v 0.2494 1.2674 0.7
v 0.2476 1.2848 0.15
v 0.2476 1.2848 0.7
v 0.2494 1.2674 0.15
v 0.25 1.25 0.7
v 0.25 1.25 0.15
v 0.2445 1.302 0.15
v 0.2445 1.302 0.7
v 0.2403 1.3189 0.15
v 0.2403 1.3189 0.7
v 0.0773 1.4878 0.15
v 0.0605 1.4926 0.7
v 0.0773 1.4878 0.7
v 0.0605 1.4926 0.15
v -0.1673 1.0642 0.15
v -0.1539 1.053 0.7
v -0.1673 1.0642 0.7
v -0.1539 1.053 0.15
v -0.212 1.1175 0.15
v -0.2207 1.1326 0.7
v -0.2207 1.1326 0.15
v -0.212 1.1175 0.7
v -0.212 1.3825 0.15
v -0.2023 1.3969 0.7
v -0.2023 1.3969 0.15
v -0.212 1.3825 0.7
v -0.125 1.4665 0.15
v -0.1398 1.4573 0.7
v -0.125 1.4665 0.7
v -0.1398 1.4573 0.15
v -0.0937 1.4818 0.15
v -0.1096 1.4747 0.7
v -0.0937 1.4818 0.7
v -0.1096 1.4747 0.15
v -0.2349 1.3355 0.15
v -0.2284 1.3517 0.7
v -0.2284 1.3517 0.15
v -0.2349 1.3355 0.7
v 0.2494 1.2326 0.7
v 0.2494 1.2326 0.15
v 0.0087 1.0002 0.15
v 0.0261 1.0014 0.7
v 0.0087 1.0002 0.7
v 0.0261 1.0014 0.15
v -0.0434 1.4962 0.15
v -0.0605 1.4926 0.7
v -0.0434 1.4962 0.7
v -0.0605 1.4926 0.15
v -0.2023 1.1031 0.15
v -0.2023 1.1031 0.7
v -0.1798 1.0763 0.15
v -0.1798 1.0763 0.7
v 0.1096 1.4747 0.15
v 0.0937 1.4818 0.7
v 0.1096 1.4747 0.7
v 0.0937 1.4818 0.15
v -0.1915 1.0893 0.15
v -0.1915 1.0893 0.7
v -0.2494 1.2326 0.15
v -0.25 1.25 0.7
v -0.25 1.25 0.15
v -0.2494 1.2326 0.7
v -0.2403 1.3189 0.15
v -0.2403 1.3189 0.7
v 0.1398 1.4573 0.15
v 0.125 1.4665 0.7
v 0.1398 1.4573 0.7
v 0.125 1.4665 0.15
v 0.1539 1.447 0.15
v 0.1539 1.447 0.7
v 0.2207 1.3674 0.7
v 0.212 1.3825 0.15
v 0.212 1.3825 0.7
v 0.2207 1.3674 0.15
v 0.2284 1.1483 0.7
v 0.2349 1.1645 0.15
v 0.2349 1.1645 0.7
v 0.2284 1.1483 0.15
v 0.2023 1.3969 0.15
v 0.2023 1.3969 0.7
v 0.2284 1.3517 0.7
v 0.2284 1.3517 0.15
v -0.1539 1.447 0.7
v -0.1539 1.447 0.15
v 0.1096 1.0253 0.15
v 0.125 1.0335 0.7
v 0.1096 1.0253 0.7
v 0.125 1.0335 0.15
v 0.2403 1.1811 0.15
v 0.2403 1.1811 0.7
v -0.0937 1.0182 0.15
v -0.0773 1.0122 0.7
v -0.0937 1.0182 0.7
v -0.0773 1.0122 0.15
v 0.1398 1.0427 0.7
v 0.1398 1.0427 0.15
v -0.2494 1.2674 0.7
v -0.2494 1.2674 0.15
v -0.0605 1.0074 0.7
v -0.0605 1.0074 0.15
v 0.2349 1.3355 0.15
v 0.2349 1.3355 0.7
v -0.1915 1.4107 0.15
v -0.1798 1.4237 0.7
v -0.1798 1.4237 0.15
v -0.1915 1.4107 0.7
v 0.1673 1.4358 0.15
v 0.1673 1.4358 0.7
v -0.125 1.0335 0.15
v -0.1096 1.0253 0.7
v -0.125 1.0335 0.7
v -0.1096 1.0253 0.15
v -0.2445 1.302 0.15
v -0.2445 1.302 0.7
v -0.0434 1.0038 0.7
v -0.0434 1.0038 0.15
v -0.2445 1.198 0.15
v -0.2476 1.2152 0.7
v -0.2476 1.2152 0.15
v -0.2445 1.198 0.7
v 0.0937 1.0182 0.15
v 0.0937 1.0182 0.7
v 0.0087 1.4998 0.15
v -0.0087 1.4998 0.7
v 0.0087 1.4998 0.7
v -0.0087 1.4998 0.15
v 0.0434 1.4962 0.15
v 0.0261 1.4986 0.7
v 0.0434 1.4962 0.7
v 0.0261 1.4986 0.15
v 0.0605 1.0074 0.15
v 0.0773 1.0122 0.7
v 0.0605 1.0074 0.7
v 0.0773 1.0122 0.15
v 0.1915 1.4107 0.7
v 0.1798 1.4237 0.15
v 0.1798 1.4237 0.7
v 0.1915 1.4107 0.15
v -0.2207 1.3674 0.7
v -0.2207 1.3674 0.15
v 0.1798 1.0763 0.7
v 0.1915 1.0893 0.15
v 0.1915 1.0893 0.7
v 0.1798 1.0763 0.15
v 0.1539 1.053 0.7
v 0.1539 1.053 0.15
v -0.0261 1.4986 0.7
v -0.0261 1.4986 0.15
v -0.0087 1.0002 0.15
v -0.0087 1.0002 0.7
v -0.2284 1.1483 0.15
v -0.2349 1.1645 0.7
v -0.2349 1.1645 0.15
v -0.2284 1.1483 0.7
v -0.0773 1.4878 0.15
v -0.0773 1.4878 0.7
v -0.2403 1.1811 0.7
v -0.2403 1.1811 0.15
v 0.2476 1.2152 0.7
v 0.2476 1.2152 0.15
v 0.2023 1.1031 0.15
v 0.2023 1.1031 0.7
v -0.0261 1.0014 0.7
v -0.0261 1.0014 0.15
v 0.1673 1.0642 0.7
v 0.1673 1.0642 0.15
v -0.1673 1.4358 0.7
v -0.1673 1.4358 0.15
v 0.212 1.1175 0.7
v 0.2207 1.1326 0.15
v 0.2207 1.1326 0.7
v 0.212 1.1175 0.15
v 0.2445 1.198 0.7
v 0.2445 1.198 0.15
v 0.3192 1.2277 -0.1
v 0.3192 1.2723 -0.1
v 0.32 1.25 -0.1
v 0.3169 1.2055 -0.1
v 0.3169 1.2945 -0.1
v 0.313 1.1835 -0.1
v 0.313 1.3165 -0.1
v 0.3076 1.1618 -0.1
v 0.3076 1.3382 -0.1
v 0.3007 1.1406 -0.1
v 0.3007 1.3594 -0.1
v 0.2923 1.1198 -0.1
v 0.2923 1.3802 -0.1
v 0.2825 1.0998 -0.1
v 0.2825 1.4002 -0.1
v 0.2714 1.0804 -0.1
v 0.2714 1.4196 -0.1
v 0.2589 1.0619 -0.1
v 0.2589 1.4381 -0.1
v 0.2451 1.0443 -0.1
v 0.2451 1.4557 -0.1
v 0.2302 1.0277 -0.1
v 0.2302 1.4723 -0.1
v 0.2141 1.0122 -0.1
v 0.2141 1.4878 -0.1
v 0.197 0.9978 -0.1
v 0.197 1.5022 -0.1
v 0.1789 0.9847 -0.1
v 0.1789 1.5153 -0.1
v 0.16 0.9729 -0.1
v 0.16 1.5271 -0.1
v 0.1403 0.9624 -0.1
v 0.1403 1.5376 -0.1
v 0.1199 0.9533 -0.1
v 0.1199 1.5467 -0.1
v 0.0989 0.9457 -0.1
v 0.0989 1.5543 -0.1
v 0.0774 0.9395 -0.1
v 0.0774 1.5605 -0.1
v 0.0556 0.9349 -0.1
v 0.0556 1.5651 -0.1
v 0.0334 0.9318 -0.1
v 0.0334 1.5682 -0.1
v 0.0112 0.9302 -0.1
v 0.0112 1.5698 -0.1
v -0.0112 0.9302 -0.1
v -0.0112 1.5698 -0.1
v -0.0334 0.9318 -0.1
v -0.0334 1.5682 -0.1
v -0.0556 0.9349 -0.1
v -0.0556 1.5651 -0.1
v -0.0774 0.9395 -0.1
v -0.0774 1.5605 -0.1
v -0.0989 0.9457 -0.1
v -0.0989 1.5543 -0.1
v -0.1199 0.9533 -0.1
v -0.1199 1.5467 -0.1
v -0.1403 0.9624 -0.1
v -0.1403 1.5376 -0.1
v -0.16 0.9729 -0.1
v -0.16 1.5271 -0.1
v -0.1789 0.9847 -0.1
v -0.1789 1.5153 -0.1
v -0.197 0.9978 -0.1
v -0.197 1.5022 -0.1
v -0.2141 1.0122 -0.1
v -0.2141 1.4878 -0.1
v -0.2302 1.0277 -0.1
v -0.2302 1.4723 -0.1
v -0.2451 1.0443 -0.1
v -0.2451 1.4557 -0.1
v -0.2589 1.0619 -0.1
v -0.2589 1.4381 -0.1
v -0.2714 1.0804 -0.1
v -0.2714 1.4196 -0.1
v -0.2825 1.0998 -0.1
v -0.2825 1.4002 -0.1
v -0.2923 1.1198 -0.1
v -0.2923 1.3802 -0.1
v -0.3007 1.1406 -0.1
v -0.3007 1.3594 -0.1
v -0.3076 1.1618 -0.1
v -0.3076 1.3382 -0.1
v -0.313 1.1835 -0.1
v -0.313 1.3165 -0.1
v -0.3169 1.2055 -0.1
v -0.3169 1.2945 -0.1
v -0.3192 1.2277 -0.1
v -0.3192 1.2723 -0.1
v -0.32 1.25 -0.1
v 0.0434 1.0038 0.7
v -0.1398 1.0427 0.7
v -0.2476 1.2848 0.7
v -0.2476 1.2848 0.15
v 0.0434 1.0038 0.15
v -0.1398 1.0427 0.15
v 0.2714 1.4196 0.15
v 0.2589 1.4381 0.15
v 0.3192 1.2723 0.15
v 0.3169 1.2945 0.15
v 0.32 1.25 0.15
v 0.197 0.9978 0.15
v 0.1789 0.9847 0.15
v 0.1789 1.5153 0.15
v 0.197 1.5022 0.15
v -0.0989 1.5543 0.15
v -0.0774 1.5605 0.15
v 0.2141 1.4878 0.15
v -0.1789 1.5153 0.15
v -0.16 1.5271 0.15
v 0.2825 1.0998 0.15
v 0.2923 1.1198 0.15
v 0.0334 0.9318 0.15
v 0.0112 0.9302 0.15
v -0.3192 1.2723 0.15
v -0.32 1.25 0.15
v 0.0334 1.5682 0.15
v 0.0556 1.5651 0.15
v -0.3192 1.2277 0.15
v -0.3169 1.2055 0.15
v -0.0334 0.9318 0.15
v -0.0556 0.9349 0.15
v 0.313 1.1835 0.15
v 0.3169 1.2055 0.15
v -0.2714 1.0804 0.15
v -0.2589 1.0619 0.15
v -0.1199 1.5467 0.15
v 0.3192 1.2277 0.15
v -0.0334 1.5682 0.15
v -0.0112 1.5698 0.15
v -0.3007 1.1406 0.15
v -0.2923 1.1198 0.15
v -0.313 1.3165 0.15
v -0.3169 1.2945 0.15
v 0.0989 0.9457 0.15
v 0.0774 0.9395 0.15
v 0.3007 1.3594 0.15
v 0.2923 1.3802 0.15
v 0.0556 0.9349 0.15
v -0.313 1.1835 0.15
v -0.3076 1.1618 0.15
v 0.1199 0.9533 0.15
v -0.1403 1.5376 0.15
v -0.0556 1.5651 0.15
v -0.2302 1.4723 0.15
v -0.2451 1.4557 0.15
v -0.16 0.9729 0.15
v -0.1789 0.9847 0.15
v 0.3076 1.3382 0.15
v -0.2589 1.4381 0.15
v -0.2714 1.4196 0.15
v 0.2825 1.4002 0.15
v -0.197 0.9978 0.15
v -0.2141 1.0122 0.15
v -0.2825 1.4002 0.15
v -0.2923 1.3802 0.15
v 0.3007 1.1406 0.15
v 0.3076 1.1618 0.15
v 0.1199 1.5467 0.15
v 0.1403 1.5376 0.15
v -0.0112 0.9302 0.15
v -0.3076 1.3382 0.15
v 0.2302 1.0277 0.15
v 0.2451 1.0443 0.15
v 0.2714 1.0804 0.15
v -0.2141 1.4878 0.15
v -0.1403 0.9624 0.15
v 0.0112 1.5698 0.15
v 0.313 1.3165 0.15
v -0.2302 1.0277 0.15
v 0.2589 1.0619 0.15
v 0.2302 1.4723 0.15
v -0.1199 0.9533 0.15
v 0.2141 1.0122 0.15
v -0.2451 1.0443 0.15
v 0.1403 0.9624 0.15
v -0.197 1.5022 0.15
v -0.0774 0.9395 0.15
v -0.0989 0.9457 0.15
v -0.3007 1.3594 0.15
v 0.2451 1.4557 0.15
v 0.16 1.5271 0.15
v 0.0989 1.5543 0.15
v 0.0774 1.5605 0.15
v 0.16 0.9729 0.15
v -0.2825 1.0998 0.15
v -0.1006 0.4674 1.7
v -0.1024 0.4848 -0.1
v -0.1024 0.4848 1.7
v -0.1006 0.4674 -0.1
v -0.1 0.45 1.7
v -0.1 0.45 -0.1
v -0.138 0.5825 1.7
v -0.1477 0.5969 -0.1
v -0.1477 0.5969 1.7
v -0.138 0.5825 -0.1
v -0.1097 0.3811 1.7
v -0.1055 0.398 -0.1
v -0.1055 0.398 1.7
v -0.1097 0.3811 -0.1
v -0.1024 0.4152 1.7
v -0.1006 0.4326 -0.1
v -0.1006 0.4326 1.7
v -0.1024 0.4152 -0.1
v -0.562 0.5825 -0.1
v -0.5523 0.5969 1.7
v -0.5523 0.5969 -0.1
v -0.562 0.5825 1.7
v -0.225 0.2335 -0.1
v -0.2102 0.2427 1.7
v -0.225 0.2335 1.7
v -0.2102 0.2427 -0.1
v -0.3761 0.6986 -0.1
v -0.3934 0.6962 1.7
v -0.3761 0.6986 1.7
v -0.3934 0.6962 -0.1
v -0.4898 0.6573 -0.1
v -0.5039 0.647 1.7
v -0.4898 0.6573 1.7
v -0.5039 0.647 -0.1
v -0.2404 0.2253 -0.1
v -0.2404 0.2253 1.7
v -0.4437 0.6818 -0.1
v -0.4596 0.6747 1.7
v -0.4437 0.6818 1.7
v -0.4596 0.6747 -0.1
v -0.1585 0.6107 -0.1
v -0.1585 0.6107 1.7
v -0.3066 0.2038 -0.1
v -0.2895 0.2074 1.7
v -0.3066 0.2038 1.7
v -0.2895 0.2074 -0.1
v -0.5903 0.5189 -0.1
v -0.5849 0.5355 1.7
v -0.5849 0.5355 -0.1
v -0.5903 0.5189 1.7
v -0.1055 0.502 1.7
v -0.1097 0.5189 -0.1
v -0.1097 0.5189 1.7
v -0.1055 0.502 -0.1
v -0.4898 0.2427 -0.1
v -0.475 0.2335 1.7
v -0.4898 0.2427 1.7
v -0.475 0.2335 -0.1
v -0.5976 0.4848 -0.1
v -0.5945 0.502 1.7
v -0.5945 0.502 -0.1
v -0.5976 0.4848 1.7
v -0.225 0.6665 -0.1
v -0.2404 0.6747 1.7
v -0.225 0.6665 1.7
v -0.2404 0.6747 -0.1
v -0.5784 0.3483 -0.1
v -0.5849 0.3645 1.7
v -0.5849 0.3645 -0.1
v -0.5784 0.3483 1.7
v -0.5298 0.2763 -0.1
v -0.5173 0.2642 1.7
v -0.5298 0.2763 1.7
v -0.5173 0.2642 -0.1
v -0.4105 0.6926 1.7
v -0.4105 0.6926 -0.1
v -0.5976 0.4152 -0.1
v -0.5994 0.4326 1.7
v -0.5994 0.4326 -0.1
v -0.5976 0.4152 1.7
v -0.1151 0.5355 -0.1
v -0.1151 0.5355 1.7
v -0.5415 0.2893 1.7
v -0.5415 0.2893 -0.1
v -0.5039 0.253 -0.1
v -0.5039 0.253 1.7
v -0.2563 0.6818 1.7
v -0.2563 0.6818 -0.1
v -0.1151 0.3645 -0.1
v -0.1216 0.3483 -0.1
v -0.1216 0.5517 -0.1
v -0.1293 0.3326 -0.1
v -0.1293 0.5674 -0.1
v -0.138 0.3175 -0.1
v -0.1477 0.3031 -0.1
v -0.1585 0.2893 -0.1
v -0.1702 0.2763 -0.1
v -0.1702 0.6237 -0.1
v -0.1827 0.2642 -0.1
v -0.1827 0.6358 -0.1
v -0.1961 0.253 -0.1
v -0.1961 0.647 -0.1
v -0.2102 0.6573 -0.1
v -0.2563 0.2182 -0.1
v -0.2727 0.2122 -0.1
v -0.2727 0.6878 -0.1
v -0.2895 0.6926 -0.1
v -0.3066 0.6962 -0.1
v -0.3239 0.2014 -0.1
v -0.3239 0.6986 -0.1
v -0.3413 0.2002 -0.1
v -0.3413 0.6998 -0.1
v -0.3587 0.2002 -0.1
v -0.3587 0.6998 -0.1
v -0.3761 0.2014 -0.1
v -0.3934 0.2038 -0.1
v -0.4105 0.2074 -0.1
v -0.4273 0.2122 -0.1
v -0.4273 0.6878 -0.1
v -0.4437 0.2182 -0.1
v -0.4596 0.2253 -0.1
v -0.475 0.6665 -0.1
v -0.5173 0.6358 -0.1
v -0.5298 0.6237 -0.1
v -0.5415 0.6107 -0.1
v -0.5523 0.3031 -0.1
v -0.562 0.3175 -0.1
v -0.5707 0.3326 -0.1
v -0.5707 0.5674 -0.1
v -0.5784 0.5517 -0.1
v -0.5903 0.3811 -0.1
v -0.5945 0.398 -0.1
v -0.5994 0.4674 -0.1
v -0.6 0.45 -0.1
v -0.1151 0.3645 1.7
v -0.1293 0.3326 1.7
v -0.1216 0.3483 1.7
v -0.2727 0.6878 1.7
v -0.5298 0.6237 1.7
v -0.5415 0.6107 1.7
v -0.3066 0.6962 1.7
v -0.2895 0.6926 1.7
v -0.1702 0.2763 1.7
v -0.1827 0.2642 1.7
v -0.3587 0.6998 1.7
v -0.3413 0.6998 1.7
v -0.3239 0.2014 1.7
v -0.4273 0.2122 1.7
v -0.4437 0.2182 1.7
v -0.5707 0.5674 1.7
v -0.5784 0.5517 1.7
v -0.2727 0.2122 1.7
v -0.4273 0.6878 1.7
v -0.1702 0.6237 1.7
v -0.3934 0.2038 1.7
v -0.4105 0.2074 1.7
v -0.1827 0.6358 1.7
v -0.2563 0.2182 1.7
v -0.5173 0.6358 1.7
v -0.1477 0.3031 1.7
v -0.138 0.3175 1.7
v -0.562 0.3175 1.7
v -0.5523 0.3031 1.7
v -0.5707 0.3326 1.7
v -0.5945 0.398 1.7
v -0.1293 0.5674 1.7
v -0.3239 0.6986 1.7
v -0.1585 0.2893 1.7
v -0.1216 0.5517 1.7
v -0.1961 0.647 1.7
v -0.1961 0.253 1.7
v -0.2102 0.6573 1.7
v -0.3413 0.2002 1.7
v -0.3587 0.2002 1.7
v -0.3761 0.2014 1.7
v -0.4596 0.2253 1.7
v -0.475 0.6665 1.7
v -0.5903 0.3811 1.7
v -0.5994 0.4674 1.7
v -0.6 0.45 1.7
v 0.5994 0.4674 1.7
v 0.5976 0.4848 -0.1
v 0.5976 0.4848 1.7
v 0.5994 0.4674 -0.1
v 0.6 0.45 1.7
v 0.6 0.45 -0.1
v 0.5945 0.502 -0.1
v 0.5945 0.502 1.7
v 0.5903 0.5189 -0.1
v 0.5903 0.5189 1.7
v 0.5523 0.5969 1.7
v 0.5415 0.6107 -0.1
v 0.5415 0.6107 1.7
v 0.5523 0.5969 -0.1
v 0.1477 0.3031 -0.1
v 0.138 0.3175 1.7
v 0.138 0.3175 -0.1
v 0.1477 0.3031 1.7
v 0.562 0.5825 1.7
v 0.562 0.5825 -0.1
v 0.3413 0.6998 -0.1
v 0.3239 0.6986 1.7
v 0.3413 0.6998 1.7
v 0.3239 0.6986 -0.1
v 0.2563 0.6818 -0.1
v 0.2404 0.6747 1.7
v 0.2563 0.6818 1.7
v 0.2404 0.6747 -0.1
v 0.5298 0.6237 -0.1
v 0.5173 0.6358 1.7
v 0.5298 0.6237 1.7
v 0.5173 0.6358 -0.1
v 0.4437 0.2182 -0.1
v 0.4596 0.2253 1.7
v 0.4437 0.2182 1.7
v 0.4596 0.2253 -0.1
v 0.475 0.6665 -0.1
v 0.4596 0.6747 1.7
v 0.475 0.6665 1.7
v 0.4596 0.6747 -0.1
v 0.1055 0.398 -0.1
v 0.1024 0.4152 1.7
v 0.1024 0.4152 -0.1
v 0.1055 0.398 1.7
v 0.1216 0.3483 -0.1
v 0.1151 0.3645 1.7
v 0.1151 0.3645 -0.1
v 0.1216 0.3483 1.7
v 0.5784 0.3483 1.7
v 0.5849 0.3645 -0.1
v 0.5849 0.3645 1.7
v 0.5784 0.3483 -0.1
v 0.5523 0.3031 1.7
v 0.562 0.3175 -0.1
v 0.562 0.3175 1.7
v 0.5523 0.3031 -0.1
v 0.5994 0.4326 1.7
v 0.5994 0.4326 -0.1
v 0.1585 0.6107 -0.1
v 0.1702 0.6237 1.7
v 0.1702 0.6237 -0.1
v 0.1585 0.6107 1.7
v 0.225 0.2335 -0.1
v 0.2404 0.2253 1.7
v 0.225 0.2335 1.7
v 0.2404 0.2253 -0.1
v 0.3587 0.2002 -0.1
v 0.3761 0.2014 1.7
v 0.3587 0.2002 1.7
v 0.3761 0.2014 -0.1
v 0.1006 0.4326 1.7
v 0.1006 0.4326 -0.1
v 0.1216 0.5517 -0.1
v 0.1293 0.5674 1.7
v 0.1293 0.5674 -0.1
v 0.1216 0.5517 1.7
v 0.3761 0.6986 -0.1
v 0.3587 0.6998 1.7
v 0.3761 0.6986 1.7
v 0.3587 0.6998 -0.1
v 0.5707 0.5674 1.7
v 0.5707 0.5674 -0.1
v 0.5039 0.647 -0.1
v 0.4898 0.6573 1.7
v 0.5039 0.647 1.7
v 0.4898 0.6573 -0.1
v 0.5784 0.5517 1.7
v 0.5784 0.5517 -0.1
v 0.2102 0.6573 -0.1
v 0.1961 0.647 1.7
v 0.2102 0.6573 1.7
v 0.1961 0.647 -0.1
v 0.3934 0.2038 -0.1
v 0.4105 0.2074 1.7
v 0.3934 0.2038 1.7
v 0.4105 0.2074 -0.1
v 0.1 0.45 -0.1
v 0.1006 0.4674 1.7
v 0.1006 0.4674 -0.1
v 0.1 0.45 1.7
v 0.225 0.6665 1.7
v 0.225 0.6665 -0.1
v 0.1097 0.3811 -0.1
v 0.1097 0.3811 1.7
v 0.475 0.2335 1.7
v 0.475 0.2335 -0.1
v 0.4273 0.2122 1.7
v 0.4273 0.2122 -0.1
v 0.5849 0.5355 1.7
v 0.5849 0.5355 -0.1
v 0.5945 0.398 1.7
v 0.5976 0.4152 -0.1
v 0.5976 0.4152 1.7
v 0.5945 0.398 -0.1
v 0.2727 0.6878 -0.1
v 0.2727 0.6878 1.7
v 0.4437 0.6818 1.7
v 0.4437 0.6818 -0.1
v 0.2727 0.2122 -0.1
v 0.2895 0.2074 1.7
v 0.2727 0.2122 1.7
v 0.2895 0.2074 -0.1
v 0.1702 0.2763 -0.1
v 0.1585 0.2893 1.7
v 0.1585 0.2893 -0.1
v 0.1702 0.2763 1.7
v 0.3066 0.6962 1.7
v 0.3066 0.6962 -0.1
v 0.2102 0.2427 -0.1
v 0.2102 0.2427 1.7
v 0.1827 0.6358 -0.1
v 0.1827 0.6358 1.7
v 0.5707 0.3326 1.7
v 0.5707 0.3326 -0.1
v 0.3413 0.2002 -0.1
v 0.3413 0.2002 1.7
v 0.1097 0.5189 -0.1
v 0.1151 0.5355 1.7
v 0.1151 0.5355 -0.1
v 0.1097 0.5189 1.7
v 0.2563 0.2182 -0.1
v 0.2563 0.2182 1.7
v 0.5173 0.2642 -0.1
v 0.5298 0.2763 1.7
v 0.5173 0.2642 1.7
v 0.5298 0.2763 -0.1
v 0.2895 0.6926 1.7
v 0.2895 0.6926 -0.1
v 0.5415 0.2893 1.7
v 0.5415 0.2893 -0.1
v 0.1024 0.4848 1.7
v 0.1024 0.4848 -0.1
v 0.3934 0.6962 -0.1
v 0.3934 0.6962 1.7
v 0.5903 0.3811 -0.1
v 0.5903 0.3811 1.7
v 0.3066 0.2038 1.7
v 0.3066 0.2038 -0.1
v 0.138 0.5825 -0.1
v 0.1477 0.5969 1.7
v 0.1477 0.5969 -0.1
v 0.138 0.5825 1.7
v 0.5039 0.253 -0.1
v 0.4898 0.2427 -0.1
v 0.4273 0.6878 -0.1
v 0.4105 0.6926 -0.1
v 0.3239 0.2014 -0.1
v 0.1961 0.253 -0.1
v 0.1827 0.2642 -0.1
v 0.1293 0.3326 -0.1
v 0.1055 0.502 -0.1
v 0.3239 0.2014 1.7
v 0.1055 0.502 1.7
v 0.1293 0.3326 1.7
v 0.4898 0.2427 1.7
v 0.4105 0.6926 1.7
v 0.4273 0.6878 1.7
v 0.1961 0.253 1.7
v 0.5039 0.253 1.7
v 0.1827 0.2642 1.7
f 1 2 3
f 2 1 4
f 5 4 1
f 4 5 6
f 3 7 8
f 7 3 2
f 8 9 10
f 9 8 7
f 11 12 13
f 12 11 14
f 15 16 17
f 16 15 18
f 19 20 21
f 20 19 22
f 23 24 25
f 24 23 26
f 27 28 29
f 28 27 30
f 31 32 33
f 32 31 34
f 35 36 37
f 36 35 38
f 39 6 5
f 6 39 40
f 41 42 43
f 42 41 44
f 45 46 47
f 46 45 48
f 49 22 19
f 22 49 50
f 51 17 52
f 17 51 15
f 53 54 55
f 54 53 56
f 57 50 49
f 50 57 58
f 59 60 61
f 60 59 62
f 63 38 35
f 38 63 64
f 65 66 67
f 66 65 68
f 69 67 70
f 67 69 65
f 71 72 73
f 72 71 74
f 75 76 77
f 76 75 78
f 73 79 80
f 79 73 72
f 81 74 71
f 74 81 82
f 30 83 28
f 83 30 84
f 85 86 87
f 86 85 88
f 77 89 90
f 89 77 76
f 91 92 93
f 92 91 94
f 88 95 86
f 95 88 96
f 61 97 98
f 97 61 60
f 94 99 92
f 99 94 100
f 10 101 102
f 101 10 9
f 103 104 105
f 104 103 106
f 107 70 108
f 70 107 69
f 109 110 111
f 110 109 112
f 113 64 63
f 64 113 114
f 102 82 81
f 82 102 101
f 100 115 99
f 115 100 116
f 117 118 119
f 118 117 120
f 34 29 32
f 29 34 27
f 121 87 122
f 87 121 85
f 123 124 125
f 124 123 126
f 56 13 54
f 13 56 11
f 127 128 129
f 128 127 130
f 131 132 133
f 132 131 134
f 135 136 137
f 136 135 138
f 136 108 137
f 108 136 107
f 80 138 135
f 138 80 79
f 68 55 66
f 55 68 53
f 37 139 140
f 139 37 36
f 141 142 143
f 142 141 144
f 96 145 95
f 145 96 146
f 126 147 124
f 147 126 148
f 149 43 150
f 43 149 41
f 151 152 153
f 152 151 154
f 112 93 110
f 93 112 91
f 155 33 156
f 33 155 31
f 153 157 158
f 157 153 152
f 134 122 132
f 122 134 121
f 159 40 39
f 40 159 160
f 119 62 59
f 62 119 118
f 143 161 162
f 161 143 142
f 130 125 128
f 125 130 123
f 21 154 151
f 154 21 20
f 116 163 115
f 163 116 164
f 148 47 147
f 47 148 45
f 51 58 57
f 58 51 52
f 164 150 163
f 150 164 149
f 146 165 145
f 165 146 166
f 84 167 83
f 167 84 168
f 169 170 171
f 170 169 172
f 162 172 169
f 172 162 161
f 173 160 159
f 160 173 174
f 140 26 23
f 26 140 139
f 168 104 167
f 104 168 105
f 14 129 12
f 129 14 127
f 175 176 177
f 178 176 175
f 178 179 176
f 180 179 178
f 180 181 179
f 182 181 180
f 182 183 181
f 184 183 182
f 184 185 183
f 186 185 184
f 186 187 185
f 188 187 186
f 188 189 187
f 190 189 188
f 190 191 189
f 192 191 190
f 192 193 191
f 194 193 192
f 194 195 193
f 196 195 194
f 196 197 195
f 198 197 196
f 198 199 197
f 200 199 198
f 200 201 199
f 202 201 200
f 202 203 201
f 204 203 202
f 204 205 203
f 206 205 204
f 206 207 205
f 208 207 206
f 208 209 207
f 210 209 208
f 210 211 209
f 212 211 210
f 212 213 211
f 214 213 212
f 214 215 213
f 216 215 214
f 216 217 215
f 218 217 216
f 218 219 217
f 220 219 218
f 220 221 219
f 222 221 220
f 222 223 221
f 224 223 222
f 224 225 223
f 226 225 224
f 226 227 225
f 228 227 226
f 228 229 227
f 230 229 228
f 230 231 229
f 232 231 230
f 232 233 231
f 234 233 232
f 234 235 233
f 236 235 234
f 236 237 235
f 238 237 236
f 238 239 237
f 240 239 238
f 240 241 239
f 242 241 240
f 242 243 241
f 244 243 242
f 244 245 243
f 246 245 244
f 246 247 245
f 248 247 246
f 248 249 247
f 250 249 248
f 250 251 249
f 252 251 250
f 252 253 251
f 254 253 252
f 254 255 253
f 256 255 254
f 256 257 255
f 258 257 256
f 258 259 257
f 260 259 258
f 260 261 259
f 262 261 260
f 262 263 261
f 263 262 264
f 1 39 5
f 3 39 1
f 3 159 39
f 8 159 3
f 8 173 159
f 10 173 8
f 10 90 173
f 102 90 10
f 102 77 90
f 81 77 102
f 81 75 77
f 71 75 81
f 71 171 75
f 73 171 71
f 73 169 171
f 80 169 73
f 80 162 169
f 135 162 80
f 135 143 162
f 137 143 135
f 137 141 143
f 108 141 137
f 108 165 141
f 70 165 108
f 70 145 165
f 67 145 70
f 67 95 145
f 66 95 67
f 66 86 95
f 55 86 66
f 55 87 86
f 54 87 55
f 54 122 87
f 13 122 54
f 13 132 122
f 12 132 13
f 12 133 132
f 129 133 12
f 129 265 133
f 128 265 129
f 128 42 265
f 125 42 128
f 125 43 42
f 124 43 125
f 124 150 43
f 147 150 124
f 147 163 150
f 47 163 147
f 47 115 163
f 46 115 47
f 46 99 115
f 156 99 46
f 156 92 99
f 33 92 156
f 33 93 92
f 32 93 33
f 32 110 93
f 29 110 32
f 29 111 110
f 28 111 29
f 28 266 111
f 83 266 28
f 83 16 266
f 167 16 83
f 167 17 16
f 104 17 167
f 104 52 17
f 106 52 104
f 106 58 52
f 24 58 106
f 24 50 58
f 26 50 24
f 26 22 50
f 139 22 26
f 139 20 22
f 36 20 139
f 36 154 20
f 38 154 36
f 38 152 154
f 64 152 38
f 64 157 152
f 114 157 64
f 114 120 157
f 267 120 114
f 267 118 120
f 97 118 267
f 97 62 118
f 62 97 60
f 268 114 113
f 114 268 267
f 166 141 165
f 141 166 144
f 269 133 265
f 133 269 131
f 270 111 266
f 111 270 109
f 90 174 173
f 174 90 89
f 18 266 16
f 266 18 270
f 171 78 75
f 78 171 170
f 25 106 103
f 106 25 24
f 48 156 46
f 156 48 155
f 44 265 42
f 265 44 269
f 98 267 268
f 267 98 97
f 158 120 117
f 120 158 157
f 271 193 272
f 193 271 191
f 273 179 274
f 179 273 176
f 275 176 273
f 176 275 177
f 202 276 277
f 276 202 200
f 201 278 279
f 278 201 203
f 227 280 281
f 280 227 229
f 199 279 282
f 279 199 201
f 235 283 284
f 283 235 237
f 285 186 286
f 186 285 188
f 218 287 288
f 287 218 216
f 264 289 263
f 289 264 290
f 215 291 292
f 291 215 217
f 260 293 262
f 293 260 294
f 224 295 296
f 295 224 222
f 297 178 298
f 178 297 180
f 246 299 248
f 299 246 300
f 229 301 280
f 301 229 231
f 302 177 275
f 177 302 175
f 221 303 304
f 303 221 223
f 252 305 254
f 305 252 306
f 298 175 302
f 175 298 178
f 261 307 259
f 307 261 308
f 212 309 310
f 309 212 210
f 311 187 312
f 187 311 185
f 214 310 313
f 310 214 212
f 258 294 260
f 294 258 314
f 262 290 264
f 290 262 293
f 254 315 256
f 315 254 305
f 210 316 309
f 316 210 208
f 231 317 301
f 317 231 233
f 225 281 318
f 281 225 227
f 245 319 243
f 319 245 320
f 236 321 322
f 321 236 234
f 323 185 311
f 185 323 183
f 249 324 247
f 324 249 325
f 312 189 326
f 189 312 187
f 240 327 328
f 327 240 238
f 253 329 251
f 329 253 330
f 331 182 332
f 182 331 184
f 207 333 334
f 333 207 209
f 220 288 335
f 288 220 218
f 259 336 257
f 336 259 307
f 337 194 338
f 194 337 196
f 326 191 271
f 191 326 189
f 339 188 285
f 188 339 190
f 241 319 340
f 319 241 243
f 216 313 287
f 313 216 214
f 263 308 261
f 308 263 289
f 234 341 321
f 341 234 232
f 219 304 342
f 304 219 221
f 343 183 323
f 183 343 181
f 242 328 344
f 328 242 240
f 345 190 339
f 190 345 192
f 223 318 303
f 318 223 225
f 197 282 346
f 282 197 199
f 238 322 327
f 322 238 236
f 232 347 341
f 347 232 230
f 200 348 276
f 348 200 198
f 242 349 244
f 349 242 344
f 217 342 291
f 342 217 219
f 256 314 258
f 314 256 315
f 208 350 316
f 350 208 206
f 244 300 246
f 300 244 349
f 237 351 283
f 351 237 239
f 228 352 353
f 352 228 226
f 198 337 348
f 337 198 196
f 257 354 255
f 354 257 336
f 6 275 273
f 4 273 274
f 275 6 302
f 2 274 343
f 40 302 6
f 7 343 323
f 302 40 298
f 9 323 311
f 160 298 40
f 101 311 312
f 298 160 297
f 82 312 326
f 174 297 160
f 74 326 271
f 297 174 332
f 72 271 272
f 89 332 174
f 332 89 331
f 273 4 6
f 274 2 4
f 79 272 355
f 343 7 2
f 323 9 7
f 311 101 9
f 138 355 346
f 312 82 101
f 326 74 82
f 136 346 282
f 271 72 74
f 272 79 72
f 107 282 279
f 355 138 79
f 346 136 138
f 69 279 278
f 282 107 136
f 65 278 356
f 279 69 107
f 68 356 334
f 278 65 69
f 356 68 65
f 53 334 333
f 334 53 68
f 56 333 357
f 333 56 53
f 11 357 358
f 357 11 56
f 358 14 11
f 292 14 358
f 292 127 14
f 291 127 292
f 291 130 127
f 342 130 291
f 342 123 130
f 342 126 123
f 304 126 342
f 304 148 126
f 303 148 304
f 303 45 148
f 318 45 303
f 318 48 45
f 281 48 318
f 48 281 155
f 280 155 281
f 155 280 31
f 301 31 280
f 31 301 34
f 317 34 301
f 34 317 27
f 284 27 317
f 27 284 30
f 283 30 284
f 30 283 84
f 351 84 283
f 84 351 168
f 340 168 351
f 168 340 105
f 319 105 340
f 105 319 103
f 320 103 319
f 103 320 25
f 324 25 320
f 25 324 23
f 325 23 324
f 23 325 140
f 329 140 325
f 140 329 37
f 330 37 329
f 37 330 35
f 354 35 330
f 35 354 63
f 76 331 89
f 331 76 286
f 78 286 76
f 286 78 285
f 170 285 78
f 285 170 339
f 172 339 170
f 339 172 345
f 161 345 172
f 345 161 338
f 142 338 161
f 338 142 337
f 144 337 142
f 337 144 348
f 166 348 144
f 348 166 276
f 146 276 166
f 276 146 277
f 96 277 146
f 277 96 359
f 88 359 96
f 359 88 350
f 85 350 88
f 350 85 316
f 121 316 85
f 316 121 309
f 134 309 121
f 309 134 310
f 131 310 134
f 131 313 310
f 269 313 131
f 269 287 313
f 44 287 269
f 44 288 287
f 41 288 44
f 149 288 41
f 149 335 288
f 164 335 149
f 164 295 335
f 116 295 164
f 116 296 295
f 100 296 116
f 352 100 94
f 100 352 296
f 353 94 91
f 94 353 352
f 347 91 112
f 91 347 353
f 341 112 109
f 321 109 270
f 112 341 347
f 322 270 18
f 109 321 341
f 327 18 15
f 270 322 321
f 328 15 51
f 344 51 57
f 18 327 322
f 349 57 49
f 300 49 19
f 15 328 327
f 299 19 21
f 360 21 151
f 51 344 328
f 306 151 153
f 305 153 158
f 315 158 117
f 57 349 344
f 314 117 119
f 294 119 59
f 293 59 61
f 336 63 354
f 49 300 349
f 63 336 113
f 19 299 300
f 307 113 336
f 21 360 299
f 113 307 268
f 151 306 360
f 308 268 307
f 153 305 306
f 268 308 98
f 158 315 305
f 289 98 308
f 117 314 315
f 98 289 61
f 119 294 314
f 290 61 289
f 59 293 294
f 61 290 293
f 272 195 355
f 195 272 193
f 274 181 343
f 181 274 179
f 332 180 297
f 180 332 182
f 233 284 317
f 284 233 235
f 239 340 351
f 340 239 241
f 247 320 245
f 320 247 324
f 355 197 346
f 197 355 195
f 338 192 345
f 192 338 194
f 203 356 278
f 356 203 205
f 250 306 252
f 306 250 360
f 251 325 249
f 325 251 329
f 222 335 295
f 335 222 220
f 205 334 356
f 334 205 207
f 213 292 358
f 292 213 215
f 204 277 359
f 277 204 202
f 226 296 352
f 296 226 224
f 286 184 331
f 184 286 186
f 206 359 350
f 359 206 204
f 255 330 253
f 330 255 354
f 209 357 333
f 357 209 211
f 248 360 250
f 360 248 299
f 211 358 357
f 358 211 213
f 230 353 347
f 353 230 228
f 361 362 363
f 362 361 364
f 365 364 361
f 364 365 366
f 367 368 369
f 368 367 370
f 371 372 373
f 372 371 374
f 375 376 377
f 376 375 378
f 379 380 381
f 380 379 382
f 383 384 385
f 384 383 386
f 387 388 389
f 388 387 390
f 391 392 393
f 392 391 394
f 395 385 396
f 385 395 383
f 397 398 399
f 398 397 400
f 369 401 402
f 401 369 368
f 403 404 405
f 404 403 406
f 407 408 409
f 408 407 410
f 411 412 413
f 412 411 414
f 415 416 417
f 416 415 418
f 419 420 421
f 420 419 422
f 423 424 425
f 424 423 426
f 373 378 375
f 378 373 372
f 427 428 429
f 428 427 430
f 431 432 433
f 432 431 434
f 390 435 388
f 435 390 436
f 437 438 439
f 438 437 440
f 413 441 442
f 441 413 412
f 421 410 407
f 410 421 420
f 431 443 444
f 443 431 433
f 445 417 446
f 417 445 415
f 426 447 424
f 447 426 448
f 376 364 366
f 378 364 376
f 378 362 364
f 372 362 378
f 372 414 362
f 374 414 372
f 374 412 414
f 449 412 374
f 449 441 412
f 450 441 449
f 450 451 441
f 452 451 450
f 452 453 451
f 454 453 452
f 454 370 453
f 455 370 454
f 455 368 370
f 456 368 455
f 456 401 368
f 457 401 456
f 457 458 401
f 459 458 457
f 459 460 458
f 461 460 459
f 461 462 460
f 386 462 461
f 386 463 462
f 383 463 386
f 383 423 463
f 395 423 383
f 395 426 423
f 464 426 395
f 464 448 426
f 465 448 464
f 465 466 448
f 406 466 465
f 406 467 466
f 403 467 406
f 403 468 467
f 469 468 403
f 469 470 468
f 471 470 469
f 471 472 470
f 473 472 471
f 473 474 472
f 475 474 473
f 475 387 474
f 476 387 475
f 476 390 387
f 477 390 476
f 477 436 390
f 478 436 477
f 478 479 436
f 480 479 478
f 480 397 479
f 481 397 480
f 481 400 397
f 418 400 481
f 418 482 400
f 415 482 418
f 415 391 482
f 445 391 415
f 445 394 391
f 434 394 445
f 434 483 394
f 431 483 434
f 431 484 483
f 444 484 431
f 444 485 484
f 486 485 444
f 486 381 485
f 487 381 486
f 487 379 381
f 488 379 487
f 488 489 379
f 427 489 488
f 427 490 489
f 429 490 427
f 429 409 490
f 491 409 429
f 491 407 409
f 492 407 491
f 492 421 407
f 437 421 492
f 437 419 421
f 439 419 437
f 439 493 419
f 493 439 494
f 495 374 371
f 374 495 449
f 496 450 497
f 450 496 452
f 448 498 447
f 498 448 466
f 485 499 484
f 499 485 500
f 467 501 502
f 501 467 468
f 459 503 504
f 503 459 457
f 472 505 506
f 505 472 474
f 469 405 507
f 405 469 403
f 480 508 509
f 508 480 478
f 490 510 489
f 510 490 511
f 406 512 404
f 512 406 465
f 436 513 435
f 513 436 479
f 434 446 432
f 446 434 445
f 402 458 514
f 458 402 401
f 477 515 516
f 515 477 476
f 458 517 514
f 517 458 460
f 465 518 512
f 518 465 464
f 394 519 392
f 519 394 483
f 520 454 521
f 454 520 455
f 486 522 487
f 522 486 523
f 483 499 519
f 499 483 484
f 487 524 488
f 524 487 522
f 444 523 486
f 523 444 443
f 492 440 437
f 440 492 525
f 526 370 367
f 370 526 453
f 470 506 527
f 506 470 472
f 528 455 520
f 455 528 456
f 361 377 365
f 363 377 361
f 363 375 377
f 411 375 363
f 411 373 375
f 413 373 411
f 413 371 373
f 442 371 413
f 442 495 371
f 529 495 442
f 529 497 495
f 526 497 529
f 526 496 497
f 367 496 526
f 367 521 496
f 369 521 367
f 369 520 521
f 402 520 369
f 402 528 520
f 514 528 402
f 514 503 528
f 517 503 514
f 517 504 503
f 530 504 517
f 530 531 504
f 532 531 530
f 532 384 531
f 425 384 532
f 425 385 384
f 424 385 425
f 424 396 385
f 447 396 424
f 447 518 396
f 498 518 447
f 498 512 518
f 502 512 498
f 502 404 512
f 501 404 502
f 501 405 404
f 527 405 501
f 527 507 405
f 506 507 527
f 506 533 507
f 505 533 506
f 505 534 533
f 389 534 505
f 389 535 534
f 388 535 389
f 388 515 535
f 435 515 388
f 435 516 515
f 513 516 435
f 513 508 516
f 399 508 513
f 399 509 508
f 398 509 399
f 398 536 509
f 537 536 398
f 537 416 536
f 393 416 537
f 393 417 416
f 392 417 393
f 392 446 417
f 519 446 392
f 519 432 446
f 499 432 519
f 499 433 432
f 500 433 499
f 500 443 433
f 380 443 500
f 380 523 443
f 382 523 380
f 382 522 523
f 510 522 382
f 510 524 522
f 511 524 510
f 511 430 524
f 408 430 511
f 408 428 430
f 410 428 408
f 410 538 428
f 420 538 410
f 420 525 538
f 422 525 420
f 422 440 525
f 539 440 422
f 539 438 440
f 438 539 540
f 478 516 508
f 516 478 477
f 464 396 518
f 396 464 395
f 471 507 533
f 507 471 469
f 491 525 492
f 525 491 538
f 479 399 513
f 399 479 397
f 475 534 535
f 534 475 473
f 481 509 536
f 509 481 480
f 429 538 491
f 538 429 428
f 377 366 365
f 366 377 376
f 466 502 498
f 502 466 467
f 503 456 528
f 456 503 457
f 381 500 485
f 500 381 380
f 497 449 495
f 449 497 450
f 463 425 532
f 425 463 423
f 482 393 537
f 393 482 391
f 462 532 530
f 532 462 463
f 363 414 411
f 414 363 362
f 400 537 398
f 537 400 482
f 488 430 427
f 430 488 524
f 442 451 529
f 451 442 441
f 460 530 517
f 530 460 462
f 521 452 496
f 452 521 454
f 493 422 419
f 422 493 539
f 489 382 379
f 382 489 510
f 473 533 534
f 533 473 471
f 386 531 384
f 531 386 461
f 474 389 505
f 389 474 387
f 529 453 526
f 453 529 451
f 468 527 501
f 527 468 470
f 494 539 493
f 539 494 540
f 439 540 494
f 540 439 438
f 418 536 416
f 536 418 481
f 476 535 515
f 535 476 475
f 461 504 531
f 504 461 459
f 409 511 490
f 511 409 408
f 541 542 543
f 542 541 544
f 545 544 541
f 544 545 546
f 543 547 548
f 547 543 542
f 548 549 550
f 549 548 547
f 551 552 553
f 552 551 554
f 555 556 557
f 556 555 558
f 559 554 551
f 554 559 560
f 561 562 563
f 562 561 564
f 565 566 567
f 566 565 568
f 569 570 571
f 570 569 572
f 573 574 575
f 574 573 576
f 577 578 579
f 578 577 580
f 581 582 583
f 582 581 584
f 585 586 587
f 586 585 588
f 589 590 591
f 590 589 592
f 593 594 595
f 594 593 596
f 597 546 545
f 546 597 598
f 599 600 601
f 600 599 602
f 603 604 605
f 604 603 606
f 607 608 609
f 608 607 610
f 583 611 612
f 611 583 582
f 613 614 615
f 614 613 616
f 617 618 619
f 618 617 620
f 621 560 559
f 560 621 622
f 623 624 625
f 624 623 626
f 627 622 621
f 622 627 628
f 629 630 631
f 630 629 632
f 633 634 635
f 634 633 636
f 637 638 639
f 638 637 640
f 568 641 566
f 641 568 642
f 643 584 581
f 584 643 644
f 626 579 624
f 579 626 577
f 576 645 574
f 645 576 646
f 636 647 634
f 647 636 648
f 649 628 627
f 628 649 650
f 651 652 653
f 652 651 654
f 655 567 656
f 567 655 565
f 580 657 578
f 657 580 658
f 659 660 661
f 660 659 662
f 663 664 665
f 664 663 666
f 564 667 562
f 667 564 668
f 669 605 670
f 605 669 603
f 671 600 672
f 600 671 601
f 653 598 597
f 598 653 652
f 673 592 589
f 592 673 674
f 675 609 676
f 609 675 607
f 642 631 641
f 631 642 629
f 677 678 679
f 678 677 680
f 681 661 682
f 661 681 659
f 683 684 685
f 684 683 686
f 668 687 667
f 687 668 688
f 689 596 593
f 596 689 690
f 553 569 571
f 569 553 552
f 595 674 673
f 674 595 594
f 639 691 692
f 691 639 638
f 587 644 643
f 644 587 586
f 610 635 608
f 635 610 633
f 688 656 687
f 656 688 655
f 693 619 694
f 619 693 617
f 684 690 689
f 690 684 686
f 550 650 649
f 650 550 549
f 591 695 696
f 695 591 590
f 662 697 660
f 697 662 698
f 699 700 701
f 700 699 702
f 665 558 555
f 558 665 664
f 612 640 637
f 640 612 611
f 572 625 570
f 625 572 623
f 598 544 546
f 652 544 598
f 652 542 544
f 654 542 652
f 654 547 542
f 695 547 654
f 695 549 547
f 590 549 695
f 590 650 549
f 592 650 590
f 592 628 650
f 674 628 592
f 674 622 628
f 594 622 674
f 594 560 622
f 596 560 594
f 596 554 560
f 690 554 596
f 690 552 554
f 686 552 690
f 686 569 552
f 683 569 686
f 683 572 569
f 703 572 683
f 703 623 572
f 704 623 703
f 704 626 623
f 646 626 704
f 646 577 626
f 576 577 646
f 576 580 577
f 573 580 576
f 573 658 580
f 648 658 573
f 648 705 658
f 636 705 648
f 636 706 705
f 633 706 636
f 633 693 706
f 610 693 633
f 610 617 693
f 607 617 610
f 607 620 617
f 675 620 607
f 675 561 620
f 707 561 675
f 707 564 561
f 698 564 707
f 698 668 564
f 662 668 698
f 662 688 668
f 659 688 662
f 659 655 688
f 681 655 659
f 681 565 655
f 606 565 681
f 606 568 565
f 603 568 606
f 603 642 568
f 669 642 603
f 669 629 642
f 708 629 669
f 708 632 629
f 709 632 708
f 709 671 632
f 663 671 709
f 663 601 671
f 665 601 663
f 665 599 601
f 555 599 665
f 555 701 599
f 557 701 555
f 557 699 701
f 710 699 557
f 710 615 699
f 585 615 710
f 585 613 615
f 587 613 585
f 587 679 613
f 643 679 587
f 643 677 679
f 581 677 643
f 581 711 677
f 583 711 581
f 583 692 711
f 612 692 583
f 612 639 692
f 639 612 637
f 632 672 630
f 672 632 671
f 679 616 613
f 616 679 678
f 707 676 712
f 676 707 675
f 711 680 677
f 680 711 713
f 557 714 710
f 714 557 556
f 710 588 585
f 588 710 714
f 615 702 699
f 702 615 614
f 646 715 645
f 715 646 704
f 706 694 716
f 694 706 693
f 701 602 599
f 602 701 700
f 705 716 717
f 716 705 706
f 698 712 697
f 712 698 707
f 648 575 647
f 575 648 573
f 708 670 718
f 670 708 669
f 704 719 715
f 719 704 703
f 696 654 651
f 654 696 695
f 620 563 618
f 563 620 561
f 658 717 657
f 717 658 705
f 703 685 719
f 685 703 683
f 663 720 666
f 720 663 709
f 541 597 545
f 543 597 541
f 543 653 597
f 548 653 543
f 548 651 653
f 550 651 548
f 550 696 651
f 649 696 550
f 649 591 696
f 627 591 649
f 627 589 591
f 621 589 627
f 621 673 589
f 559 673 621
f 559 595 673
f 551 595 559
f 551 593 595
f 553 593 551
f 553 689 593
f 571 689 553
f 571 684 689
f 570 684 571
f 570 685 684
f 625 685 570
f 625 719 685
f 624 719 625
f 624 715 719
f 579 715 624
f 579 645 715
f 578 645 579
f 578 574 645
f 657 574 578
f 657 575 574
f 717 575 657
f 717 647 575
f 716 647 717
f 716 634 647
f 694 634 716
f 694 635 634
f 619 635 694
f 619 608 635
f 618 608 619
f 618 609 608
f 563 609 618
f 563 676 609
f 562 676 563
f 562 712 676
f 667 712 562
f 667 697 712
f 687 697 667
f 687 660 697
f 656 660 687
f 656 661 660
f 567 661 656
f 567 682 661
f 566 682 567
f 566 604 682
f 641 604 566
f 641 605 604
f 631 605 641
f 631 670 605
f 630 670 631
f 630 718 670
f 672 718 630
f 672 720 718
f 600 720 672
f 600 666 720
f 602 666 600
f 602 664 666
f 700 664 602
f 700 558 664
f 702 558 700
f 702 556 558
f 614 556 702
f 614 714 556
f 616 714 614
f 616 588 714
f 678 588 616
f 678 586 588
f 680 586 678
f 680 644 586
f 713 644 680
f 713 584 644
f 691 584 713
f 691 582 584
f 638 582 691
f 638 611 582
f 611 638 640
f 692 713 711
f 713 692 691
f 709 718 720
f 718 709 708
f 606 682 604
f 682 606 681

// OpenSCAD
$fn = 90;

function size(v) = sqrt(v.x*v.x + v.y*v.y + v.z*v.z);

fs1 = [-0.35, 0.45, -0.1];
fs2 = [0.35, 0.45, -0.1];

led = [0, 1.25, -0.1];
//led2 = [0.35, 1.25, -0.2];

ch = 1.6;

//difference() {
%    translate([-0.8, 0, 0]) cube([1.6, 1.6, ch]);
    
    translate(fs1) cylinder(h = 1.8, r = 0.25);
    translate(fs2) cylinder(h = 1.8, r = 0.25);
    
    translate(led) {
        cylinder(h = ch - 0.8, r = 0.25);
        cylinder(h = 0.25, r = 0.32);
        }
         
 //   }
